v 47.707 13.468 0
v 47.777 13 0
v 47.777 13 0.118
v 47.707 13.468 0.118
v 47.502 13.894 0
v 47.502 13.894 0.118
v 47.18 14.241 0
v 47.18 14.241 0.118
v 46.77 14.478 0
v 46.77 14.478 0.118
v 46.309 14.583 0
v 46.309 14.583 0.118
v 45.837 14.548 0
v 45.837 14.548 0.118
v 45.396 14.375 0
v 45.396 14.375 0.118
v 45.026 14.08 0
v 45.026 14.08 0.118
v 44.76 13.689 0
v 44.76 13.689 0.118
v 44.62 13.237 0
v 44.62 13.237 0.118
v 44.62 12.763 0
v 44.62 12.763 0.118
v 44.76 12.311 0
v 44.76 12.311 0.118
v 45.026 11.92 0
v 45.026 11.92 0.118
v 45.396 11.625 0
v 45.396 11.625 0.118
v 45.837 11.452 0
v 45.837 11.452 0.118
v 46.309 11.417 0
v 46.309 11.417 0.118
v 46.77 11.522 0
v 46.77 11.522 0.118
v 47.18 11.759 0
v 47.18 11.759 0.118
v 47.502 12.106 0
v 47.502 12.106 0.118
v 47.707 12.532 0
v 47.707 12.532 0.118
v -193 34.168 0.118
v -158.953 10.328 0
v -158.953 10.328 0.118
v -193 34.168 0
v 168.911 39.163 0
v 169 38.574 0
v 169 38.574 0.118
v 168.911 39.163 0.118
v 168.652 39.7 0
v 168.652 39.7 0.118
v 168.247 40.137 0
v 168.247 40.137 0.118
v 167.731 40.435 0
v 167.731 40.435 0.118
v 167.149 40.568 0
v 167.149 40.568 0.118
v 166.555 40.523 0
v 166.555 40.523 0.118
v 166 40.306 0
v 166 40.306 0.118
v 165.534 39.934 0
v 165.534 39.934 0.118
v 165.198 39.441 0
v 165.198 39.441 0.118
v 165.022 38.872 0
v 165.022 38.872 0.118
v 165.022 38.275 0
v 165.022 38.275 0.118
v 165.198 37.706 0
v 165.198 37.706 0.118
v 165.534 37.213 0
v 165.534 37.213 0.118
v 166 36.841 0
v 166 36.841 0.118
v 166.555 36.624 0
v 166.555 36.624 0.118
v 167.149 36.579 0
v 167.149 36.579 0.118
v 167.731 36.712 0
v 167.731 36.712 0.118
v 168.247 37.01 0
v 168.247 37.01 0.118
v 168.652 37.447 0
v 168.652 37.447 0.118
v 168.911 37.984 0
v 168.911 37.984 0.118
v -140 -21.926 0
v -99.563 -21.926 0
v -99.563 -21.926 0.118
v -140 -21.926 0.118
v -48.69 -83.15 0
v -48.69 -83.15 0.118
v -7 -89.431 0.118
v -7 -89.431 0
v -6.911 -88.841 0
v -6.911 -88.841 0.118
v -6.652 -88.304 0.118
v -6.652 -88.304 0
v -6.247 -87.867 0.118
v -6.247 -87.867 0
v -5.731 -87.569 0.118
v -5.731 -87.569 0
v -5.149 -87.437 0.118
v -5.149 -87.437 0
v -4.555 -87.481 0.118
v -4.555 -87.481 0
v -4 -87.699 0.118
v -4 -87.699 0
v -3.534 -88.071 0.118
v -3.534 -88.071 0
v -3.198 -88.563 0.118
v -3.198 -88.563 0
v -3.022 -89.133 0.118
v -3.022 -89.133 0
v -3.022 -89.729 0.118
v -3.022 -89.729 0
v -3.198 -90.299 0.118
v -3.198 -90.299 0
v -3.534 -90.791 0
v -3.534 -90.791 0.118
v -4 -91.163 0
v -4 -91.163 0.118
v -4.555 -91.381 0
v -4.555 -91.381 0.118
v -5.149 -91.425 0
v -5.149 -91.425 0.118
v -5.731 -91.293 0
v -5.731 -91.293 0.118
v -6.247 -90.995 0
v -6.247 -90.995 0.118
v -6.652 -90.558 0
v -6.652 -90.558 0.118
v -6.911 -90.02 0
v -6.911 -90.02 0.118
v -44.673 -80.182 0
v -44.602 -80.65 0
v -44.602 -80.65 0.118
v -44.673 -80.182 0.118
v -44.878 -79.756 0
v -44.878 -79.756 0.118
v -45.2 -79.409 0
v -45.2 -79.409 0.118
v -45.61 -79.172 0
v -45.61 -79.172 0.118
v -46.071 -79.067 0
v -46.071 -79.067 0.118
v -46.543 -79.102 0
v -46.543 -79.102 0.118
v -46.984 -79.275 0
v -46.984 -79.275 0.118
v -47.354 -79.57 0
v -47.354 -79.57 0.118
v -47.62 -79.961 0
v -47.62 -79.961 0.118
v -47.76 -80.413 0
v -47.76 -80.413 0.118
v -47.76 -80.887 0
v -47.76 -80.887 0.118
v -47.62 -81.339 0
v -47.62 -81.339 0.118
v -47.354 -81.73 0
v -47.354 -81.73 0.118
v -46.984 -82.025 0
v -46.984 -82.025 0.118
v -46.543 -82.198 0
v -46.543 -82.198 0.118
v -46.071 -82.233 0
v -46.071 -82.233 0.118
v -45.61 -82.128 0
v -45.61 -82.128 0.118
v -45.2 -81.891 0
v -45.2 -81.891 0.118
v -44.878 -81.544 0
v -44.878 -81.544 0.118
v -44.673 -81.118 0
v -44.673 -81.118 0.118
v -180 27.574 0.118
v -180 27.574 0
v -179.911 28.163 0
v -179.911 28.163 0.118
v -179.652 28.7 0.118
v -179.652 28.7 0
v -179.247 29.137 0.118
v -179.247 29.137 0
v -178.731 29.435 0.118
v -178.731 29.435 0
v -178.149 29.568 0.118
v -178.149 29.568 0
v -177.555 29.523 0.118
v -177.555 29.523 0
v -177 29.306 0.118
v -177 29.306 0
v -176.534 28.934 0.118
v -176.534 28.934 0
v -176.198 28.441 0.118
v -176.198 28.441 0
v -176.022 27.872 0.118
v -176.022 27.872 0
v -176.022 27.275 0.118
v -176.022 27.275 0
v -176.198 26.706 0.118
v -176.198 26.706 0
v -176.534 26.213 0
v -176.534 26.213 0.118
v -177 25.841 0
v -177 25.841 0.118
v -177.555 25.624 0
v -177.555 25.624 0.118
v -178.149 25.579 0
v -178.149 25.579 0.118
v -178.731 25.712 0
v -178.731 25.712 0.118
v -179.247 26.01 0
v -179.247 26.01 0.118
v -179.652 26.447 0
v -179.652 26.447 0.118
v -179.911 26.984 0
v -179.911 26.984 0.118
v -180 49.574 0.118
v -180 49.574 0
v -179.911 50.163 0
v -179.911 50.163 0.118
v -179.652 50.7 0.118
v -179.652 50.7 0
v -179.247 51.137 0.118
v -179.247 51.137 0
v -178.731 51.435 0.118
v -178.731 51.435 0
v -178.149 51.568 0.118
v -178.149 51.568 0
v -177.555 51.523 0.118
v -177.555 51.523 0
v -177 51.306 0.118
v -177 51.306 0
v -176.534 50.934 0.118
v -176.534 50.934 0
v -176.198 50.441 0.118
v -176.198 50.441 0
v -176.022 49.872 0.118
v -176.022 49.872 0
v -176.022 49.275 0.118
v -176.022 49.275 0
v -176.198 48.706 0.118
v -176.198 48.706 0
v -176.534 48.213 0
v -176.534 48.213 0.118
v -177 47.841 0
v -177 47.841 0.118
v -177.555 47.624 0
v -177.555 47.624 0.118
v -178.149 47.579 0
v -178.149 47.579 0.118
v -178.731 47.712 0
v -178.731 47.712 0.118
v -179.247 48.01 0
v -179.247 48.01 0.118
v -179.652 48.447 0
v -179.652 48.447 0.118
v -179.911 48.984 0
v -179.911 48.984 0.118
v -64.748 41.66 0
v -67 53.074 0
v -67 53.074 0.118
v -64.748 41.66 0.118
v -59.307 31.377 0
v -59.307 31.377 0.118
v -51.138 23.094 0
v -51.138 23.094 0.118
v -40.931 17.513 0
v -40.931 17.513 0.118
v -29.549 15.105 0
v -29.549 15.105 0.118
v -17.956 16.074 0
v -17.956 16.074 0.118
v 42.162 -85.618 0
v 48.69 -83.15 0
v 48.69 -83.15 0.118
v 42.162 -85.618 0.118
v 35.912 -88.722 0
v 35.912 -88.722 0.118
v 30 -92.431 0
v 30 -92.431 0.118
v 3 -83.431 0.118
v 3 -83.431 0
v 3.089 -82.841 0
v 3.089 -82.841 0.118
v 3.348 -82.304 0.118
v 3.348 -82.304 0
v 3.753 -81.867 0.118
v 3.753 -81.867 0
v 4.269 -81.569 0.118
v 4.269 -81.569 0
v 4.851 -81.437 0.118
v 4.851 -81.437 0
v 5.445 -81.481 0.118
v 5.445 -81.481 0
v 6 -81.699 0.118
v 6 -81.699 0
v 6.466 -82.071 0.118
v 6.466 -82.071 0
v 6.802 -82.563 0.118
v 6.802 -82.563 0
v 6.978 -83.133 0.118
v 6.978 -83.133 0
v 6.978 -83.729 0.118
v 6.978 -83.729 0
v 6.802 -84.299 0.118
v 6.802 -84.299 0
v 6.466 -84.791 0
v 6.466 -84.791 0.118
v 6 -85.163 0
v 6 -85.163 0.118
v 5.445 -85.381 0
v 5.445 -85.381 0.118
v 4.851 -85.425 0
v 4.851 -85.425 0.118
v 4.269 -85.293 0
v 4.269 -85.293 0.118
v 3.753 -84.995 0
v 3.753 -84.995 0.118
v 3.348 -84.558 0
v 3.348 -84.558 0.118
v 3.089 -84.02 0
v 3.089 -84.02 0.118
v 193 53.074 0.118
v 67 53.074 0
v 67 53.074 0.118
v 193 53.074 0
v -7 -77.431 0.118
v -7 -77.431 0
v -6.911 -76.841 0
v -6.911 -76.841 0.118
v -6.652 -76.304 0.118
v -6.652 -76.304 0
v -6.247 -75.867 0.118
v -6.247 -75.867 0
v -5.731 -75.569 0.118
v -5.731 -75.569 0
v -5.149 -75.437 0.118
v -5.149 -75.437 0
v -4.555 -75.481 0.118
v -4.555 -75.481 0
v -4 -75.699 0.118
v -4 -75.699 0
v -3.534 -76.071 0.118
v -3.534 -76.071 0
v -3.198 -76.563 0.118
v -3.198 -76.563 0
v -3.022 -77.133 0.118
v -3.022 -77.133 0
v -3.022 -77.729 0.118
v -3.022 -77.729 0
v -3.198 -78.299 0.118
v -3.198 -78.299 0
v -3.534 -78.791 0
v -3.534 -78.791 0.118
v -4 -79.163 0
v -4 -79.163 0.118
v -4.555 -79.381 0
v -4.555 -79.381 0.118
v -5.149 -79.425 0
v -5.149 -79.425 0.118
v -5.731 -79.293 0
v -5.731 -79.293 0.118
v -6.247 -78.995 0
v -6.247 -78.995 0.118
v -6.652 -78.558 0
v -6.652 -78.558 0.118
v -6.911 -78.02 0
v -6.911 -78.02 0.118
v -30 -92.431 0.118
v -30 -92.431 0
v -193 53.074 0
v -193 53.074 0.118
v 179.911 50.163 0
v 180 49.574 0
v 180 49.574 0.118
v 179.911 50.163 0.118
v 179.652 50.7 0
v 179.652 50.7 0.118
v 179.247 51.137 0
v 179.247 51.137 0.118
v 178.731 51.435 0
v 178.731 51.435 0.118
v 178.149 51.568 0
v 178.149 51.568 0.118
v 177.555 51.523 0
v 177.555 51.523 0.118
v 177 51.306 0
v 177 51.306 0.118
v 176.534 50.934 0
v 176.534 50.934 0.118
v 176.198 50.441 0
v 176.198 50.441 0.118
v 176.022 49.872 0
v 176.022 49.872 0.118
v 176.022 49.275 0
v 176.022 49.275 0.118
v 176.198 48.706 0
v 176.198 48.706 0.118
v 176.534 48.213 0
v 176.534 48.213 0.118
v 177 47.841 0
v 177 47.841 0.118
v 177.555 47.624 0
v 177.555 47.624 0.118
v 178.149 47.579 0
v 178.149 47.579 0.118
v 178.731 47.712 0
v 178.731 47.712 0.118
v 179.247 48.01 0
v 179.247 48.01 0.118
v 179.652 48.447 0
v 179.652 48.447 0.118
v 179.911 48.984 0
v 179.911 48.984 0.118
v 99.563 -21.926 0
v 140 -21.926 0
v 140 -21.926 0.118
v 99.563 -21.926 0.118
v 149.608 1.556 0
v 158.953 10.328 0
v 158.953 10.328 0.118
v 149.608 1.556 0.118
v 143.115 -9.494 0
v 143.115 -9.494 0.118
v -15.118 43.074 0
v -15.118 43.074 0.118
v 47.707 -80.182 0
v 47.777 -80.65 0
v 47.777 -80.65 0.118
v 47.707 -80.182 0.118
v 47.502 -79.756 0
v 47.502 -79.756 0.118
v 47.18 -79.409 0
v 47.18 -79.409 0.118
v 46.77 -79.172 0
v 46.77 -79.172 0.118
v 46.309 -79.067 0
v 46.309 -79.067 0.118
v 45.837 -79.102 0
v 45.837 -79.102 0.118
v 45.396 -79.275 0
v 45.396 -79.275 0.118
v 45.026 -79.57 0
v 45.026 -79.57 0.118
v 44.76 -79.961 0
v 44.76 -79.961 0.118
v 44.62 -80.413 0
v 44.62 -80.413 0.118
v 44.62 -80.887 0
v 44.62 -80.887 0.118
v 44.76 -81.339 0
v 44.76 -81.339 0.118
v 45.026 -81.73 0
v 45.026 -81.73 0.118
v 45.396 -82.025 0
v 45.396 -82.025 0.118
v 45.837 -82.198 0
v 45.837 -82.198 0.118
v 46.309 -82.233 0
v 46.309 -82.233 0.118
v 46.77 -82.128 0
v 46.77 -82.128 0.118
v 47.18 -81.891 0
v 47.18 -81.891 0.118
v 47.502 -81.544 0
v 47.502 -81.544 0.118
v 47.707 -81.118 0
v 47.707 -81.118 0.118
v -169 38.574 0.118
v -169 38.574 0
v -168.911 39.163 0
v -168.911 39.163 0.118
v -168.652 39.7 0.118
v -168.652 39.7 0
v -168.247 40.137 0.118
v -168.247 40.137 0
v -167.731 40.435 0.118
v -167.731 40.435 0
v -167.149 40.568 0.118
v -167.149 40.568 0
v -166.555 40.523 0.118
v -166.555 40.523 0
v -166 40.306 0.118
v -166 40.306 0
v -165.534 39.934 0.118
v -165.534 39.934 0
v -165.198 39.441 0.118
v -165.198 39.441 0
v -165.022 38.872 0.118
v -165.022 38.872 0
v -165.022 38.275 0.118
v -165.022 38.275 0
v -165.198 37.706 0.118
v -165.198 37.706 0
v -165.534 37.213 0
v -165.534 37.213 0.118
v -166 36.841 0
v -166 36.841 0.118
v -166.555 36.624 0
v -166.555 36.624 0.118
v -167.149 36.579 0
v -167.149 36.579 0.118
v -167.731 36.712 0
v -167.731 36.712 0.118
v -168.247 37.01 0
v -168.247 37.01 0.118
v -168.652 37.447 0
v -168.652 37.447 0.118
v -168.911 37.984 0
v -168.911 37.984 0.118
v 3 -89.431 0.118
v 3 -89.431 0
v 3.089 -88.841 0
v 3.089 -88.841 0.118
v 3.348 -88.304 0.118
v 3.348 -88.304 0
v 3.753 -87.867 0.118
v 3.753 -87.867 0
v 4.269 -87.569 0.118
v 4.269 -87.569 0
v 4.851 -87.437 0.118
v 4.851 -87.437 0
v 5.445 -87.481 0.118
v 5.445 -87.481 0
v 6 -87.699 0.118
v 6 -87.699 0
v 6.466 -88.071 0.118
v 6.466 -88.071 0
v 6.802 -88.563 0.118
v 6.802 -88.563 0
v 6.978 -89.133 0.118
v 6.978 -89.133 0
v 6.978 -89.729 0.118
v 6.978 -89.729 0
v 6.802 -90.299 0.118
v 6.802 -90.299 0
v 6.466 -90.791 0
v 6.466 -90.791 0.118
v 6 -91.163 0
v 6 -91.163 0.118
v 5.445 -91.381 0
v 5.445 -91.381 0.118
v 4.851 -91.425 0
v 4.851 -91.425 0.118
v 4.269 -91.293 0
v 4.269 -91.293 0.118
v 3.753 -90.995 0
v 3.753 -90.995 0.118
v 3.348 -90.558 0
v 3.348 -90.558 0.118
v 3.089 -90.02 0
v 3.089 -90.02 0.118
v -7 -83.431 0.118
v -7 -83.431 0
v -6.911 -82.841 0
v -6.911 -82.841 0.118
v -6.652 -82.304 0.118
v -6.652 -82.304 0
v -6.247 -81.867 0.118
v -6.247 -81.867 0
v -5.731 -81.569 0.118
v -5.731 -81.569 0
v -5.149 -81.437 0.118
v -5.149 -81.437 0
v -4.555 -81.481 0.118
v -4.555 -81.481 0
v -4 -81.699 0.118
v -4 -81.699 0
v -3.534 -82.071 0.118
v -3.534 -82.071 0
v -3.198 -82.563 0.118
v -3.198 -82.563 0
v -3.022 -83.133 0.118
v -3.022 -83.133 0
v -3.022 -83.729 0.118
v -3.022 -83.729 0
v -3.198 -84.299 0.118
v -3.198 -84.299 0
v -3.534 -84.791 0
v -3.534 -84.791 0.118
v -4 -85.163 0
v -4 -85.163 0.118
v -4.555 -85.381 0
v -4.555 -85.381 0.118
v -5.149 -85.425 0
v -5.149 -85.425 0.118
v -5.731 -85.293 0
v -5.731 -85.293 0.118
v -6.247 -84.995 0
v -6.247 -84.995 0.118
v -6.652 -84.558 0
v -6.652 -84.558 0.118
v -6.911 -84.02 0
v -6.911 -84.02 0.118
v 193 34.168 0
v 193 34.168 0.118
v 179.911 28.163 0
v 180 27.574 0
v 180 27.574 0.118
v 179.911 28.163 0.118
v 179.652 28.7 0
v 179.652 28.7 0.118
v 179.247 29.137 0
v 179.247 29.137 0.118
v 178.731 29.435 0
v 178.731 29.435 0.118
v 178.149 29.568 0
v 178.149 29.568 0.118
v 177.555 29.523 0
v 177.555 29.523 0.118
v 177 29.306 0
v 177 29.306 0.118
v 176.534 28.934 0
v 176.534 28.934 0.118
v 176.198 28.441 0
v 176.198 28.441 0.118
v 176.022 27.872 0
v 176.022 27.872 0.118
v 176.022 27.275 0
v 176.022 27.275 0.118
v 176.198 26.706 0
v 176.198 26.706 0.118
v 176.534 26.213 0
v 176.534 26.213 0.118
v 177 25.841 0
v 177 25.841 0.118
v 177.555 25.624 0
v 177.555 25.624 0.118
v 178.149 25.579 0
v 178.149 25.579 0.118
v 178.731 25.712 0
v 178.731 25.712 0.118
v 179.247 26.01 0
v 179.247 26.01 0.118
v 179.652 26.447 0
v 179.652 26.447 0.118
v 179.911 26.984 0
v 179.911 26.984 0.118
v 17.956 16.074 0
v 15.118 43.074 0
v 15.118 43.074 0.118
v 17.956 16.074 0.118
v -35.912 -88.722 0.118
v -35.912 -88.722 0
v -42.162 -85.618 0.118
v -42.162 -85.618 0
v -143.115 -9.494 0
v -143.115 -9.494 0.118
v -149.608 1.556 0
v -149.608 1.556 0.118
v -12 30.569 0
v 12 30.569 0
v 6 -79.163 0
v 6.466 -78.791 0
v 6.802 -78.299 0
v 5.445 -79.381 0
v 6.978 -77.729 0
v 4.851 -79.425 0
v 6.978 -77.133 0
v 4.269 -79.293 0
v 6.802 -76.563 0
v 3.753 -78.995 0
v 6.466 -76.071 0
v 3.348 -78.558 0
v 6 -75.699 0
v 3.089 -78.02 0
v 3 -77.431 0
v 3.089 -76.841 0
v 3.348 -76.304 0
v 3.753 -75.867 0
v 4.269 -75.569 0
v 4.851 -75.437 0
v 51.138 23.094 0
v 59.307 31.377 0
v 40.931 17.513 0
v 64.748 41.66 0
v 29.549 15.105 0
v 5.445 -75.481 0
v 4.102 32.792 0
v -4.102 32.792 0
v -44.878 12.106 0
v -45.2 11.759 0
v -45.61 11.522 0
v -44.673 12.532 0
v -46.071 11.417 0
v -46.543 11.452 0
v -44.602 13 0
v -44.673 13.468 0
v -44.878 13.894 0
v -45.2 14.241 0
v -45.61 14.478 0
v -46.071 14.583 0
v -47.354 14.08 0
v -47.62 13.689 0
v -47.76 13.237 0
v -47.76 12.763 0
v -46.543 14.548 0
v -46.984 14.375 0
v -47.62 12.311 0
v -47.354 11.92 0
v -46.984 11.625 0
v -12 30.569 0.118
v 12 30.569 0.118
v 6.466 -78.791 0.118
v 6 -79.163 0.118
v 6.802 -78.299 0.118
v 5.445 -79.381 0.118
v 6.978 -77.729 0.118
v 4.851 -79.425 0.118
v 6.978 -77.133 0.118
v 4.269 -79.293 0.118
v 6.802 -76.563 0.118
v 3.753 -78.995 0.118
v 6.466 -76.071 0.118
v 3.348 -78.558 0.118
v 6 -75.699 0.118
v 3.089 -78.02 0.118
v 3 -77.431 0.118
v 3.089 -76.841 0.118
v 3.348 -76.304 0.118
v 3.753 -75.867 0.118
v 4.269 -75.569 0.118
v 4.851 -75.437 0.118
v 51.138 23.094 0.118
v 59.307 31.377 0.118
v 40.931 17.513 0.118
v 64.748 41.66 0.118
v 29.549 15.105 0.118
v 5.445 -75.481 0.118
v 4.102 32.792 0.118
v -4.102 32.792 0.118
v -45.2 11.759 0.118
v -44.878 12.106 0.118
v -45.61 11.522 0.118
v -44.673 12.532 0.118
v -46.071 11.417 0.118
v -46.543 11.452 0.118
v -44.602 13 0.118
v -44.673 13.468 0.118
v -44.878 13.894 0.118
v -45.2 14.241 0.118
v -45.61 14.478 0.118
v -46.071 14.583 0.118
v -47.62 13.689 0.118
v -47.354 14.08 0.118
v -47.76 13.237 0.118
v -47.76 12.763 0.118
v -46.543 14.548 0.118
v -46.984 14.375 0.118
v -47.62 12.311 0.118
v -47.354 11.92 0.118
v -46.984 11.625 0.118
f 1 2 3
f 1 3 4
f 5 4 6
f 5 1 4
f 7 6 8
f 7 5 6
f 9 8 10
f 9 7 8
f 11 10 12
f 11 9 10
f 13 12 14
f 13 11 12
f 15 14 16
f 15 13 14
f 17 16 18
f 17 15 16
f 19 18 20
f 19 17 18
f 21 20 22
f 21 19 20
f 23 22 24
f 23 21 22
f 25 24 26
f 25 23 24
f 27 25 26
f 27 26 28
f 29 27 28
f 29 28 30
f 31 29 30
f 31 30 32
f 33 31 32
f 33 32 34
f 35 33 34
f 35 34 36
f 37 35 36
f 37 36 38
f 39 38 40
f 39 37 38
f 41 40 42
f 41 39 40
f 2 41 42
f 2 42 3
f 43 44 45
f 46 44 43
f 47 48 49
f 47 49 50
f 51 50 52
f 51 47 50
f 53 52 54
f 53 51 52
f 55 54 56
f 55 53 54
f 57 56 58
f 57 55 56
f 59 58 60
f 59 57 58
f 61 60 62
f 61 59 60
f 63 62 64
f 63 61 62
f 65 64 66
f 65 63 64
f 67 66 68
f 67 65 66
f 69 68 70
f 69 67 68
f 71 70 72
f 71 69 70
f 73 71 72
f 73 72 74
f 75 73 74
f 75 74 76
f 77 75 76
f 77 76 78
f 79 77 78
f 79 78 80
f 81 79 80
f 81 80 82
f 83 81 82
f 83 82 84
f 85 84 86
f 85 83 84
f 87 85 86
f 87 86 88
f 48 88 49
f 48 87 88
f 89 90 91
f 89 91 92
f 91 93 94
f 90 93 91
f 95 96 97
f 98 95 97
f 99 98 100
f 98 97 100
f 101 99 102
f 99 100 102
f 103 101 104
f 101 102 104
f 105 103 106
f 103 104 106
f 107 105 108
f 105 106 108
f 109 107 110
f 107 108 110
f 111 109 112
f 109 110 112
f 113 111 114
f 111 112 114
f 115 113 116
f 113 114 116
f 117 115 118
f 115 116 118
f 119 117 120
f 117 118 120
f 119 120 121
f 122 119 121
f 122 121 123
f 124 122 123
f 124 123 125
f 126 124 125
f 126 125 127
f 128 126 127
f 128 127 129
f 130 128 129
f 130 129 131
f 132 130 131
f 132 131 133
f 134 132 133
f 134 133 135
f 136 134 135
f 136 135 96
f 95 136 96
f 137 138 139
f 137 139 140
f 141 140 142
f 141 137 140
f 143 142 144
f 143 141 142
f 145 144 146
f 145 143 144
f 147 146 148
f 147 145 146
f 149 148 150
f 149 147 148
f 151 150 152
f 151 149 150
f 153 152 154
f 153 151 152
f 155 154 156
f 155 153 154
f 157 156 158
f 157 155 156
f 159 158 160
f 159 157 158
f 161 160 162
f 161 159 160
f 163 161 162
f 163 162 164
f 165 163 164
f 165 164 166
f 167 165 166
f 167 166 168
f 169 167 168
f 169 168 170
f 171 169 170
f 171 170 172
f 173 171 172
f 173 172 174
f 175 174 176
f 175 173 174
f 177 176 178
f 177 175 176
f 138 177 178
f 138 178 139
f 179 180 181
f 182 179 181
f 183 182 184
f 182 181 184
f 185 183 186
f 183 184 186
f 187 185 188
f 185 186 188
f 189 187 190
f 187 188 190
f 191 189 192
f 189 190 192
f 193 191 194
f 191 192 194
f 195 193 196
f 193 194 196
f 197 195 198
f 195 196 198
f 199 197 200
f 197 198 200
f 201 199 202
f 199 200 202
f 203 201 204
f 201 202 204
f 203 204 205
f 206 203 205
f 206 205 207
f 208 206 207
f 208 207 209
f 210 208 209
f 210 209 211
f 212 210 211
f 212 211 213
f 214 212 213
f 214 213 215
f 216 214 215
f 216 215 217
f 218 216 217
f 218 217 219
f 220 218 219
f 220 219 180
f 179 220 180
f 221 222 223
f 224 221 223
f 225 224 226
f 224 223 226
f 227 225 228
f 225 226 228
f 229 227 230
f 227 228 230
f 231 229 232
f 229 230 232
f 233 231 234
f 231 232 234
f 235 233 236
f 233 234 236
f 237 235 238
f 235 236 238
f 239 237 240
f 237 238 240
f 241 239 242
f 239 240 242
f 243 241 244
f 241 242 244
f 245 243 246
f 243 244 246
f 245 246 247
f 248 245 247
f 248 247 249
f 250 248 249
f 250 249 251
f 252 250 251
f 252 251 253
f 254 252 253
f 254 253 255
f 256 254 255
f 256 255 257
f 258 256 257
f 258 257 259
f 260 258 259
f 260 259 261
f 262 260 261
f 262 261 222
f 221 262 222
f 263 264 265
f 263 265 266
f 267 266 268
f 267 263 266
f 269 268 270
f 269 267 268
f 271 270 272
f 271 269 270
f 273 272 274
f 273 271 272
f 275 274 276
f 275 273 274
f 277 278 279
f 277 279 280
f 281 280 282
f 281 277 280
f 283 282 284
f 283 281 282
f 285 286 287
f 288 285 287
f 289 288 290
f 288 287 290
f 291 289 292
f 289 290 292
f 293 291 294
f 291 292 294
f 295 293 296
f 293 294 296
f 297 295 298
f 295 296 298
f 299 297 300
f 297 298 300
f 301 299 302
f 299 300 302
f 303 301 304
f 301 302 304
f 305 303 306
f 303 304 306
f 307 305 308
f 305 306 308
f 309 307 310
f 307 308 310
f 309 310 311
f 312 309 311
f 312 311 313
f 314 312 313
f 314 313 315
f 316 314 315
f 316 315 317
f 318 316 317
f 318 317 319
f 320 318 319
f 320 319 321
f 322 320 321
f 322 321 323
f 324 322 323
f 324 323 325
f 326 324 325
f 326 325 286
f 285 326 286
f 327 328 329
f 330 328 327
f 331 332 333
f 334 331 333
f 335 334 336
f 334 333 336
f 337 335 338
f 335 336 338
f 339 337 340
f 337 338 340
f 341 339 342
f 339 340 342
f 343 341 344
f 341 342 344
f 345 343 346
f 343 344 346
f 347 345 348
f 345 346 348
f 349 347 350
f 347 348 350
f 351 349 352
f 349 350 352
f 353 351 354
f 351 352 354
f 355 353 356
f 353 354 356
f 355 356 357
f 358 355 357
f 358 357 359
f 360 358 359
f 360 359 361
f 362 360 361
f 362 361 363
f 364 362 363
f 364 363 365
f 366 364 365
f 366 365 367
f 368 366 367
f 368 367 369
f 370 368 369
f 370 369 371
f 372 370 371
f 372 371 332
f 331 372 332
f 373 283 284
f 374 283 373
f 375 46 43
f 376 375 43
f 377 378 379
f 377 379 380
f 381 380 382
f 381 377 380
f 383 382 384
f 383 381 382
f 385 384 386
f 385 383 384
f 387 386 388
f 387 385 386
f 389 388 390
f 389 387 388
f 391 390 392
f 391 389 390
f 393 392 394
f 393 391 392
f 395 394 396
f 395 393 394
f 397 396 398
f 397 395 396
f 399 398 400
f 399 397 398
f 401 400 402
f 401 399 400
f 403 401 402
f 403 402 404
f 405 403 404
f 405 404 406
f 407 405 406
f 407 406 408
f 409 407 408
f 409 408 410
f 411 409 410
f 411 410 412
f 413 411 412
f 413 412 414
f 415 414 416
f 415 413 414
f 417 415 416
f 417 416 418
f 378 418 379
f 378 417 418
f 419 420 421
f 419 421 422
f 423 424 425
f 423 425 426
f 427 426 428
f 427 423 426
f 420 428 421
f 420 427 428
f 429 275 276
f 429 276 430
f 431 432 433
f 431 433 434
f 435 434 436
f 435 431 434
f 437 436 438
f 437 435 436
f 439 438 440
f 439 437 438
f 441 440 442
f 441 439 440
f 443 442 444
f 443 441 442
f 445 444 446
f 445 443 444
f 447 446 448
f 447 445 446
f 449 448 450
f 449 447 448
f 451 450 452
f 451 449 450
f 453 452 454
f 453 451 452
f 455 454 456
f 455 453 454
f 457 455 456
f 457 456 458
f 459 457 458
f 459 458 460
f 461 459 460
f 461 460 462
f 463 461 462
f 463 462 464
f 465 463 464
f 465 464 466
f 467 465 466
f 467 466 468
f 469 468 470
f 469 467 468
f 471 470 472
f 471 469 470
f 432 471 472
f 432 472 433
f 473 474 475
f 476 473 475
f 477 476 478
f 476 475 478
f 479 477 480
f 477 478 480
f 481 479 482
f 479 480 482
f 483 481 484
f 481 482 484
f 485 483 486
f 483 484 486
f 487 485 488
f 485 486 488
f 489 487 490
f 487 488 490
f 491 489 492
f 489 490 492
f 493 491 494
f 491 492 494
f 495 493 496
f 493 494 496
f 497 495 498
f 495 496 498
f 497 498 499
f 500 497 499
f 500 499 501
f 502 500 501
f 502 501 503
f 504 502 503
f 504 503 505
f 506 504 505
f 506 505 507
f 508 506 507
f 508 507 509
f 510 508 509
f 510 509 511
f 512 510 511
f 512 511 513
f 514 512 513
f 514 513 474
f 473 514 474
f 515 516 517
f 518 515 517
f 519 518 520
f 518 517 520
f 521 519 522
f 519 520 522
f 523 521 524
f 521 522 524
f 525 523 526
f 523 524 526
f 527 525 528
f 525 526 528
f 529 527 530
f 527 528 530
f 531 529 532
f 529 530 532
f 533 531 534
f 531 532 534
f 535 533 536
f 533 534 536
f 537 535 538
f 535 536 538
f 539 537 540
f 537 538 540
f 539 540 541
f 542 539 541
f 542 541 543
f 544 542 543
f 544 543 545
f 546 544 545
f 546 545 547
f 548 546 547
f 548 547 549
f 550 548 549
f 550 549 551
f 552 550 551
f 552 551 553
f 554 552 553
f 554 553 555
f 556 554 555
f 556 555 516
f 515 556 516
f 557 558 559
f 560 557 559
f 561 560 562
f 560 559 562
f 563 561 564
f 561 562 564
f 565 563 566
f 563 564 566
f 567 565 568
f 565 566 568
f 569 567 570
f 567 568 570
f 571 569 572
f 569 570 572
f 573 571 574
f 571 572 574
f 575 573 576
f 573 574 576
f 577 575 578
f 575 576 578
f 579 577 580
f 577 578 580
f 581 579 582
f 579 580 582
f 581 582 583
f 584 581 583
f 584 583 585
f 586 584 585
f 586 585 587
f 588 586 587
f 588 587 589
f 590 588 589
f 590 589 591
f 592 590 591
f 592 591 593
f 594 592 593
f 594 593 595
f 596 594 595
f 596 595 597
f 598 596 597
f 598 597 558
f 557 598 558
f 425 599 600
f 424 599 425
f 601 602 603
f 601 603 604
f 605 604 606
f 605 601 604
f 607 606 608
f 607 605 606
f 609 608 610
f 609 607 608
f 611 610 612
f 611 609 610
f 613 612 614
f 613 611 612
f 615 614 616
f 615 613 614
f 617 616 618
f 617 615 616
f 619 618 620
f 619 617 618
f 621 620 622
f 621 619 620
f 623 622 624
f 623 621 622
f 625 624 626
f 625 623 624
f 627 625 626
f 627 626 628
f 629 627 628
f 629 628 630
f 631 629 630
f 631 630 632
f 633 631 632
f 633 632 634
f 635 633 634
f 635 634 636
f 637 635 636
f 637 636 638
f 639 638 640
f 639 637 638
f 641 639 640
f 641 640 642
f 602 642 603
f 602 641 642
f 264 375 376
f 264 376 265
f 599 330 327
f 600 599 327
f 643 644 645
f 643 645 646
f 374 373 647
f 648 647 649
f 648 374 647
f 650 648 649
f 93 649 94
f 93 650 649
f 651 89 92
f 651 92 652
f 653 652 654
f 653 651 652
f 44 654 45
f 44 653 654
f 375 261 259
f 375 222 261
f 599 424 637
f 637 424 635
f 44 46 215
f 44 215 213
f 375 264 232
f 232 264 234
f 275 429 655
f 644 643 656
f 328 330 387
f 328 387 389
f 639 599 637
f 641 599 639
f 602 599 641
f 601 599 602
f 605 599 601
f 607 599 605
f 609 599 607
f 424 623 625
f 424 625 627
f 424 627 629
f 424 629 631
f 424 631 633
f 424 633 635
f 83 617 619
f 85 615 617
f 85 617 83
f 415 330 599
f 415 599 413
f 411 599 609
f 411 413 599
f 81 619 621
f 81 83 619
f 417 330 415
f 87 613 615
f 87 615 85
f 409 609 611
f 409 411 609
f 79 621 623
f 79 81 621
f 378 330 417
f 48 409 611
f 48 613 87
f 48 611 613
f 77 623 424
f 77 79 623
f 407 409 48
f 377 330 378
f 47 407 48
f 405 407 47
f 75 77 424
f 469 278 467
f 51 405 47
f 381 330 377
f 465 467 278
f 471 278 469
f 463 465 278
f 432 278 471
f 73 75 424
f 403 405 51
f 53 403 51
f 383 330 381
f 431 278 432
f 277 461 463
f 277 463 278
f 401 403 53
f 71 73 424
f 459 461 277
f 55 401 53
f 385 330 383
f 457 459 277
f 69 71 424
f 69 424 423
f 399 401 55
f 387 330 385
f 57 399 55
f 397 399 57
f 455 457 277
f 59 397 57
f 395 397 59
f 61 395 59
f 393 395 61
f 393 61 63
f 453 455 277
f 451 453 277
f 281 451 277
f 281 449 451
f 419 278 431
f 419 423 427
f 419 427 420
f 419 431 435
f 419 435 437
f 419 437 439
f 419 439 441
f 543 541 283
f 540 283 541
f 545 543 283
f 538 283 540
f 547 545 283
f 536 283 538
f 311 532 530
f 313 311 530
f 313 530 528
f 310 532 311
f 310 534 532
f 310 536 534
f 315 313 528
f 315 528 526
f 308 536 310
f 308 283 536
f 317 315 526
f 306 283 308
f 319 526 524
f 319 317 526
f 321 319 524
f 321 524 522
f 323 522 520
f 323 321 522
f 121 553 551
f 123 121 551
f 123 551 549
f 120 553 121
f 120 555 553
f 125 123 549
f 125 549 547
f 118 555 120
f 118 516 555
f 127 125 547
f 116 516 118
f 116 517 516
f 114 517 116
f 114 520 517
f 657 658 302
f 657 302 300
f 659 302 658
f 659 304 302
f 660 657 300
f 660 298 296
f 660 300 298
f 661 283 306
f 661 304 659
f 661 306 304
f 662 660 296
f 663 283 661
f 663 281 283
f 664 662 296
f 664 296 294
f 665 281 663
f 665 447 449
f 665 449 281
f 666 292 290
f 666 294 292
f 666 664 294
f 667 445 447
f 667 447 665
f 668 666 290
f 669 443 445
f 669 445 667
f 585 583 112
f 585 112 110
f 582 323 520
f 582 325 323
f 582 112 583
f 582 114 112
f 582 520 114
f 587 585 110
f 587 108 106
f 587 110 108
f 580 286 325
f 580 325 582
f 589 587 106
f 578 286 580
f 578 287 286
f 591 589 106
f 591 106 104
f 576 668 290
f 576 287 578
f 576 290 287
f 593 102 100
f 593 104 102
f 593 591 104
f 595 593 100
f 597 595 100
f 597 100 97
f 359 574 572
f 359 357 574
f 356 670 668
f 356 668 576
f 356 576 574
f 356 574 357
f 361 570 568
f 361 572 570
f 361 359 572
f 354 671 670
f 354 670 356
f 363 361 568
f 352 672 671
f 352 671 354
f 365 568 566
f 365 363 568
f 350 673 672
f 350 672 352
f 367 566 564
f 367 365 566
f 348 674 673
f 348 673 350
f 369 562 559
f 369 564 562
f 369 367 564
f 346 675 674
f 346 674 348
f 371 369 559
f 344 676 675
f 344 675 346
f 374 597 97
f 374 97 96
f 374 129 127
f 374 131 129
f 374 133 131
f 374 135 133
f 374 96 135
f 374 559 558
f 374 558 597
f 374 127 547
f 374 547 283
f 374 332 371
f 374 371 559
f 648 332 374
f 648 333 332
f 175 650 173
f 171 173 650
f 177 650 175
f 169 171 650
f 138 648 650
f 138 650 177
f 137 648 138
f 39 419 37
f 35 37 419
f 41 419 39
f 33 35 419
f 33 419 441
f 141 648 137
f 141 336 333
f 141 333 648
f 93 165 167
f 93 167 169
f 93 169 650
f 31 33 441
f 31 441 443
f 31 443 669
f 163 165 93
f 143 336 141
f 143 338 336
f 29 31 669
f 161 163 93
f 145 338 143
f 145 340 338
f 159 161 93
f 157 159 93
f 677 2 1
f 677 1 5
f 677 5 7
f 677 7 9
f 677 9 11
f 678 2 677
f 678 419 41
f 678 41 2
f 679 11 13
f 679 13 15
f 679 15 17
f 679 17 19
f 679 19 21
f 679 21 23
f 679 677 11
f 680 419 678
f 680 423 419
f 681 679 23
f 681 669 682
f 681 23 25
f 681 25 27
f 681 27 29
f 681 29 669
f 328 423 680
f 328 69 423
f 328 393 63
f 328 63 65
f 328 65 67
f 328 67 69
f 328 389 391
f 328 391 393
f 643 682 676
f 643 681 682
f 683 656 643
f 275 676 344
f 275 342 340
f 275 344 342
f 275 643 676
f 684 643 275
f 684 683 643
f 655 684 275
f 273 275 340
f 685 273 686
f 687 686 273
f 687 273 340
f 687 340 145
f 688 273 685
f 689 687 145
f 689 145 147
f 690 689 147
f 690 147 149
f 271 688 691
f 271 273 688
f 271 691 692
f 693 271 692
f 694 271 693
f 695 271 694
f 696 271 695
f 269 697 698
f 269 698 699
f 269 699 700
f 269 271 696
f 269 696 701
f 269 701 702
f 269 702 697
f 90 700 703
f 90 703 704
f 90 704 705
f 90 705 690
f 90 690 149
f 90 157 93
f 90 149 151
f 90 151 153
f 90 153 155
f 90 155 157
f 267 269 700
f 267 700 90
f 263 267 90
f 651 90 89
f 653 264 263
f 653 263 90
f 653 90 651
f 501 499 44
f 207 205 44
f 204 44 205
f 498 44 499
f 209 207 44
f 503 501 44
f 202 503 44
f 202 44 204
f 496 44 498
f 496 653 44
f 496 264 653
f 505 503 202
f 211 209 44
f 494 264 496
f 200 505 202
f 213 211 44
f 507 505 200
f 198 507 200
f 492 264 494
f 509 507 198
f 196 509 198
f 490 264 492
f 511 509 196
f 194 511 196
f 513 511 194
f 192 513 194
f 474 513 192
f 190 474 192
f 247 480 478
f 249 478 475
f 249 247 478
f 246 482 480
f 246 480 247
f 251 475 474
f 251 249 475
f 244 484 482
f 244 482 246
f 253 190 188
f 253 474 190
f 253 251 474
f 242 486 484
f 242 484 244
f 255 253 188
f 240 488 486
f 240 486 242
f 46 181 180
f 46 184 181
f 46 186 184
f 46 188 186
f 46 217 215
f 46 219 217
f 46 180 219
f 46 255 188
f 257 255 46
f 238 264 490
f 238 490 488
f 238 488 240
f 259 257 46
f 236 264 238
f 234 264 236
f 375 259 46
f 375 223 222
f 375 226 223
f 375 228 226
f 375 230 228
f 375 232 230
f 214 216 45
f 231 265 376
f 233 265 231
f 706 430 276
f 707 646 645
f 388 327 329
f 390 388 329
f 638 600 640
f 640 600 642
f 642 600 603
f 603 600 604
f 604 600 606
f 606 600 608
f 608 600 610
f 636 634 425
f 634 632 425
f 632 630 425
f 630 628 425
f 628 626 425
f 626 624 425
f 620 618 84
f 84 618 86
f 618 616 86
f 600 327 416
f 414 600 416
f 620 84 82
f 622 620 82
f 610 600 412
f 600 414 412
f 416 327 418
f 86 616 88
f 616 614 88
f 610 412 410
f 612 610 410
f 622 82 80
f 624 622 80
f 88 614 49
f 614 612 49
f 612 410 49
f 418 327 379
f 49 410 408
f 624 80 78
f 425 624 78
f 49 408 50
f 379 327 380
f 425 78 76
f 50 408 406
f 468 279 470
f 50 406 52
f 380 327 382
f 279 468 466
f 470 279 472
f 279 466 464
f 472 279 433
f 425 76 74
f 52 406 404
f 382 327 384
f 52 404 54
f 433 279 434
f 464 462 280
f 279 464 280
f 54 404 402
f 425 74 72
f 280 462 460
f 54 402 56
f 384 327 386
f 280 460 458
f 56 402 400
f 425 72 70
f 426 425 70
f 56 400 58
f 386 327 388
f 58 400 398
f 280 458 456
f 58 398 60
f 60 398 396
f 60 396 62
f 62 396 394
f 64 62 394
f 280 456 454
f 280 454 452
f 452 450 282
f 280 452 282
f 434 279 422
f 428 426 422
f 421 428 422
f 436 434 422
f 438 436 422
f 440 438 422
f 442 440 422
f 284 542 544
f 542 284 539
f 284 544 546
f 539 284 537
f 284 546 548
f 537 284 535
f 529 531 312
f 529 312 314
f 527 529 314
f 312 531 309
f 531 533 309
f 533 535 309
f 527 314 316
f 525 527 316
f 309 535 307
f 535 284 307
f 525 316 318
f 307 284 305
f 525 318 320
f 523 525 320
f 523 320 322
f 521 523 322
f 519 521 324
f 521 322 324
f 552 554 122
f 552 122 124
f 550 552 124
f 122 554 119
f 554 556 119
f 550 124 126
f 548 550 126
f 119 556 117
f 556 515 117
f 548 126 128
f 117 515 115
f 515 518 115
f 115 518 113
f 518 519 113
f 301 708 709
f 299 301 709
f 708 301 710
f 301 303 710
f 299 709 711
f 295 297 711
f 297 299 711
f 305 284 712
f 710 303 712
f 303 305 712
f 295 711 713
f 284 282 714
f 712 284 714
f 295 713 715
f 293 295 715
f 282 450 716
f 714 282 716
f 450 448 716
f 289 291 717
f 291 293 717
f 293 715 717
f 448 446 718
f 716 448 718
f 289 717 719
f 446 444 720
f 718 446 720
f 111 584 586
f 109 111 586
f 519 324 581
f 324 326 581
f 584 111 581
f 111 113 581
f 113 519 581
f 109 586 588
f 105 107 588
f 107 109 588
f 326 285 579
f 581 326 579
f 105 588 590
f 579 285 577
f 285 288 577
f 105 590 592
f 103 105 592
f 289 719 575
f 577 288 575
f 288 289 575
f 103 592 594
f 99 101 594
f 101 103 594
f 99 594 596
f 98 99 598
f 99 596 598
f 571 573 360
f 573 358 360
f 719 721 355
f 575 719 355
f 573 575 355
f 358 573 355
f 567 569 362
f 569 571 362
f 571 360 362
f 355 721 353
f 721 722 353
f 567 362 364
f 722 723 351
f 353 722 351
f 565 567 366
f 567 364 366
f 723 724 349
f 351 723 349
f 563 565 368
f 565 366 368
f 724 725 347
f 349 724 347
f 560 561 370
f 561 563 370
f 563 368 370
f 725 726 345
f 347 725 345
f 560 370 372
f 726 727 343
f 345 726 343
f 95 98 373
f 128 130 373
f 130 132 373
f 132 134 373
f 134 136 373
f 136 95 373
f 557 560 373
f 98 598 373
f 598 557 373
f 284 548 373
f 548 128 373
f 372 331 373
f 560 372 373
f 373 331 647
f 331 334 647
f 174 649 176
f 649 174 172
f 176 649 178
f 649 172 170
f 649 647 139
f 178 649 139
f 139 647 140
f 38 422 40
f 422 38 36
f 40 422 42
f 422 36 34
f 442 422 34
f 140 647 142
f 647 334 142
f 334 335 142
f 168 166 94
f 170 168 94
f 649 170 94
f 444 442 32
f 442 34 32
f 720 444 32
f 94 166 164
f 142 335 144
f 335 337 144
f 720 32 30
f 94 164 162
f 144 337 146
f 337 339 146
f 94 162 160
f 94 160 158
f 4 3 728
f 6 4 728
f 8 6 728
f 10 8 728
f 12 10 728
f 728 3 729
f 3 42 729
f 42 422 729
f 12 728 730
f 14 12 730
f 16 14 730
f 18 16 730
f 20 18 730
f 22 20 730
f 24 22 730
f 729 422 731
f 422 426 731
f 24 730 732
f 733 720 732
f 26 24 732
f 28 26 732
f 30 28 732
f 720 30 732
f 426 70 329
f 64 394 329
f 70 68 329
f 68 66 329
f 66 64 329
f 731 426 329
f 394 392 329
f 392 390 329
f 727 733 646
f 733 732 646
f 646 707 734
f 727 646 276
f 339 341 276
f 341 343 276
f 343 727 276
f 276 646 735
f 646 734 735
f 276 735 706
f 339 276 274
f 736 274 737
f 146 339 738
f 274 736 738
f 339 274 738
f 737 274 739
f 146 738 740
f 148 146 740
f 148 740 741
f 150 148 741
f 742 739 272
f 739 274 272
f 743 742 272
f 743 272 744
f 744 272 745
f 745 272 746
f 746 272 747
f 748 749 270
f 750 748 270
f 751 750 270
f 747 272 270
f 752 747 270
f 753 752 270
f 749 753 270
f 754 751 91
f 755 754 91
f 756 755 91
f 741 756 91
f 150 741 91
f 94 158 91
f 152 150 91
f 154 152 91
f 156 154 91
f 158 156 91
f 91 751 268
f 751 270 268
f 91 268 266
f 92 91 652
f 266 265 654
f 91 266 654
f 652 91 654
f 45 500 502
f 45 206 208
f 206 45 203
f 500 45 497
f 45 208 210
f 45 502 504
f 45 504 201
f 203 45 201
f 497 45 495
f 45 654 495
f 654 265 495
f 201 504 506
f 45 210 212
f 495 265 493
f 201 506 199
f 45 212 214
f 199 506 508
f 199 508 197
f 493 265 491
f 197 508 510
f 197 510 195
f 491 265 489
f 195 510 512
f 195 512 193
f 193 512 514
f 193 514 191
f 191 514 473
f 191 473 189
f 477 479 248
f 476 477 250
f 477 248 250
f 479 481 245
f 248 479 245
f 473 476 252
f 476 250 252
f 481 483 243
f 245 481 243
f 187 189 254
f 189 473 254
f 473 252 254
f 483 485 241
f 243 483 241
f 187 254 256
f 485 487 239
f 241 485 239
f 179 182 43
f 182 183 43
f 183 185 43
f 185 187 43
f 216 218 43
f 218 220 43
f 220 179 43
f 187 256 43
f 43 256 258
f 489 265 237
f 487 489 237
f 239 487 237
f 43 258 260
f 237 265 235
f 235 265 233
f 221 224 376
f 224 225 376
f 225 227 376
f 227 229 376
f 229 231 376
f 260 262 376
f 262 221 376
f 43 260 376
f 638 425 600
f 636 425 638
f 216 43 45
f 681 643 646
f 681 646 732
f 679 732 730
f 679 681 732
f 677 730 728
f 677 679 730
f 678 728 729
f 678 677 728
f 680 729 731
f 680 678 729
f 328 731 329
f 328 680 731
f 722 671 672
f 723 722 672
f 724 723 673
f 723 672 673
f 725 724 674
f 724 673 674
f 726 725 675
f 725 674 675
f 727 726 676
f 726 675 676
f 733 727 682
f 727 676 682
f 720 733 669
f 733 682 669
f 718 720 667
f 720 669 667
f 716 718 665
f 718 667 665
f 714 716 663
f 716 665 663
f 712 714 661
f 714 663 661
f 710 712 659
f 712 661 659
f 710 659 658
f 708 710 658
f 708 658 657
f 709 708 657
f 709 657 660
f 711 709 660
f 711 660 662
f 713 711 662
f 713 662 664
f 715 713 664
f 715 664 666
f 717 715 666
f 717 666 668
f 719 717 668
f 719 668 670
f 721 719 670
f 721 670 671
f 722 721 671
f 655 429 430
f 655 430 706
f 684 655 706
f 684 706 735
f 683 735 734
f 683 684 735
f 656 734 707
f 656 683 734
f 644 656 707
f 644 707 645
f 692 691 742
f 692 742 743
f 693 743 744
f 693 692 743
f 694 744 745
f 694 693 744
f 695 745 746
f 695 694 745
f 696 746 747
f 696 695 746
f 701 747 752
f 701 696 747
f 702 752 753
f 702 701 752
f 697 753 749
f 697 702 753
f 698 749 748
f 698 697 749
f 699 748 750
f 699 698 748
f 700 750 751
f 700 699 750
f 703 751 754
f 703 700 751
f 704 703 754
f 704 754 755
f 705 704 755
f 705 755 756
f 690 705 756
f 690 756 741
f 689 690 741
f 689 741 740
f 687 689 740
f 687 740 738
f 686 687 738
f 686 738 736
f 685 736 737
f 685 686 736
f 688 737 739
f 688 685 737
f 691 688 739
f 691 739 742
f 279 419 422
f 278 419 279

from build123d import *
from OCP.BRepFilletAPI import BRepFilletAPI_MakeChamfer

# Parameters (mm, degrees)
SKETCH2_R           = 1.5875
BOSS_EXTRUDE1_DEPTH = 0.118
SKETCH3_R           = 2
CUT_EXTRUDE1_DEPTH  = 267.27056526
CHAMFER1_SIZE       = 27
CHAMFER1_SIZE2      = 32.960913897
SKETCH4_W           = 60
SKETCH4_H           = 115.138092234
CUT_EXTRUDE2_DEPTH  = 245.436114198
SKETCH5_R           = 2
CUT_EXTRUDE3_DEPTH  = 214.991810964
LPATTERN1_COUNT     = 3
LPATTERN1_PITCH     = 6


with BuildPart() as part:
    # Sketch2 → Boss-Extrude1 (new body)
    with BuildSketch(Plane.XY):
        with BuildLine():
            Line((99.563224144, -21.926473835), (48.69, -83.15))
            ThreePointArc((48.69, -83.15), (13.462751156, -108.648946204), (0, -150))
            ThreePointArc((0, -150), (-13.462751156, -108.648946204), (-48.69, -83.15))
            Line((-48.69, -83.15), (-99.563224144, -21.926473835))
            Line((-99.563224144, -21.926473835), (-140, -21.926473835))
            ThreePointArc((-140, -21.926473835), (-145.965681261, -3.736597624), (-158.952536164, 10.327631798))
            Line((-158.952536164, 10.327631798), (-220, 53.073526165))
            Line((-220, 53.073526165), (-67, 53.073526165))
            ThreePointArc((-67, 53.073526165), (-51.137889855, 23.094319589), (-17.95554779, 16.073526165))
            Line((-17.95554779, 16.073526165), (-15.117733438, 43.073526165))
            Line((-15.117733438, 43.073526165), (-12, 30.568980335))
            ThreePointArc((-12, 30.568980335), (0, 33.073526165), (12, 30.568980335))
            Line((12, 30.568980335), (15.117733438, 43.073526165))
            Line((15.117733438, 43.073526165), (17.95554779, 16.073526165))
            ThreePointArc((17.95554779, 16.073526165), (51.137889855, 23.094319589), (67, 53.073526165))
            Line((67, 53.073526165), (220, 53.073526165))
            Line((220, 53.073526165), (158.952536164, 10.327631798))
            ThreePointArc((158.952536164, 10.327631798), (145.965681261, -3.736597624), (140, -21.926473835))
            Line((140, -21.926473835), (99.563224144, -21.926473835))
        make_face()
        with Locations((46.19, 13)):
            Circle(SKETCH2_R, mode=Mode.SUBTRACT)
        with Locations((-46.19, 13)):
            Circle(SKETCH2_R, mode=Mode.SUBTRACT)
        with Locations((46.19, -80.65)):
            Circle(SKETCH2_R, mode=Mode.SUBTRACT)
        with Locations((-46.19, -80.65)):
            Circle(SKETCH2_R, mode=Mode.SUBTRACT)
    extrude(amount=BOSS_EXTRUDE1_DEPTH)

    # Sketch3 → Cut-Extrude1 (cut, through all)
    with BuildSketch(Plane(origin=(0, 0, 0), x_dir=(-1, 0, 0), z_dir=(0, 0, -1))):
        with Locations((178, 49.573526165)):
            Circle(SKETCH3_R)
        with Locations((178, 27.573526165)):
            Circle(SKETCH3_R)
        with Locations((167, 38.573526165)):
            Circle(SKETCH3_R)
    cut_extrude1 = extrude(amount=-CUT_EXTRUDE1_DEPTH, mode=Mode.SUBTRACT)

    # Mirror2: Cut-Extrude1 across plane
    add(cut_extrude1.mirror(Plane(origin=(0, 0, 0), x_dir=(0, 0, 1), z_dir=(1, 0, 0))), mode=Mode.SUBTRACT)

    # Chamfer1: one chamfer whose edges measure the first distance from different faces: ONE call of the kernel's chamfer builder (chamfer() names one face for all edges)
    chamfer1_edges_1 = [part.edges().sort_by_distance(p)[0] for p in [
        (220, 53.073526165, 0.059),
    ]]
    chamfer1_side_1 = [part.faces().sort_by_distance(p)[0] for p in [
        (143.5, 53.073526165, 0.059),
    ]]
    chamfer1_edges_2 = [part.edges().sort_by_distance(p)[0] for p in [
        (-220, 53.073526165, 0.059),
    ]]
    chamfer1_side_2 = [part.faces().sort_by_distance(p)[0] for p in [
        (-143.5, 53.073526165, 0.059),
    ]]
    chamfer1 = BRepFilletAPI_MakeChamfer(part.part.solid().wrapped)
    for e in chamfer1_edges_1:
        chamfer1.Add(CHAMFER1_SIZE, CHAMFER1_SIZE2, e.wrapped, chamfer1_side_1[0].wrapped)  # the first distance lies on this face
    for e in chamfer1_edges_2:
        chamfer1.Add(CHAMFER1_SIZE, CHAMFER1_SIZE2, e.wrapped, chamfer1_side_2[0].wrapped)  # the first distance lies on this face
    add(Compound.cast(chamfer1.Shape()), mode=Mode.REPLACE)

    # Sketch4 → Cut-Extrude2 (cut, through all)
    with BuildSketch(Plane(origin=(0, 0, 0), x_dir=(-1, 0, 0), z_dir=(0, 0, -1))):
        with Locations((0, -150)):
            Rectangle(SKETCH4_W, SKETCH4_H)
    extrude(amount=-CUT_EXTRUDE2_DEPTH, mode=Mode.SUBTRACT)

    # Sketch5 → Cut-Extrude3 (cut, through all)
    with BuildSketch(Plane(origin=(0, 0, 0), x_dir=(-1, 0, 0), z_dir=(0, 0, -1))):
        with Locations((-5, -89.430953883)):
            Circle(SKETCH5_R)
        with Locations((5, -89.430953883)):
            Circle(SKETCH5_R)
    cut_extrude3 = extrude(amount=-CUT_EXTRUDE3_DEPTH, mode=Mode.SUBTRACT)

    # LPattern1: Cut-Extrude3 ×3
    with Locations(*[(0, i * LPATTERN1_PITCH, 0) for i in range(1, LPATTERN1_COUNT)]):
        add(cut_extrude3, mode=Mode.SUBTRACT)


solid = part.part
